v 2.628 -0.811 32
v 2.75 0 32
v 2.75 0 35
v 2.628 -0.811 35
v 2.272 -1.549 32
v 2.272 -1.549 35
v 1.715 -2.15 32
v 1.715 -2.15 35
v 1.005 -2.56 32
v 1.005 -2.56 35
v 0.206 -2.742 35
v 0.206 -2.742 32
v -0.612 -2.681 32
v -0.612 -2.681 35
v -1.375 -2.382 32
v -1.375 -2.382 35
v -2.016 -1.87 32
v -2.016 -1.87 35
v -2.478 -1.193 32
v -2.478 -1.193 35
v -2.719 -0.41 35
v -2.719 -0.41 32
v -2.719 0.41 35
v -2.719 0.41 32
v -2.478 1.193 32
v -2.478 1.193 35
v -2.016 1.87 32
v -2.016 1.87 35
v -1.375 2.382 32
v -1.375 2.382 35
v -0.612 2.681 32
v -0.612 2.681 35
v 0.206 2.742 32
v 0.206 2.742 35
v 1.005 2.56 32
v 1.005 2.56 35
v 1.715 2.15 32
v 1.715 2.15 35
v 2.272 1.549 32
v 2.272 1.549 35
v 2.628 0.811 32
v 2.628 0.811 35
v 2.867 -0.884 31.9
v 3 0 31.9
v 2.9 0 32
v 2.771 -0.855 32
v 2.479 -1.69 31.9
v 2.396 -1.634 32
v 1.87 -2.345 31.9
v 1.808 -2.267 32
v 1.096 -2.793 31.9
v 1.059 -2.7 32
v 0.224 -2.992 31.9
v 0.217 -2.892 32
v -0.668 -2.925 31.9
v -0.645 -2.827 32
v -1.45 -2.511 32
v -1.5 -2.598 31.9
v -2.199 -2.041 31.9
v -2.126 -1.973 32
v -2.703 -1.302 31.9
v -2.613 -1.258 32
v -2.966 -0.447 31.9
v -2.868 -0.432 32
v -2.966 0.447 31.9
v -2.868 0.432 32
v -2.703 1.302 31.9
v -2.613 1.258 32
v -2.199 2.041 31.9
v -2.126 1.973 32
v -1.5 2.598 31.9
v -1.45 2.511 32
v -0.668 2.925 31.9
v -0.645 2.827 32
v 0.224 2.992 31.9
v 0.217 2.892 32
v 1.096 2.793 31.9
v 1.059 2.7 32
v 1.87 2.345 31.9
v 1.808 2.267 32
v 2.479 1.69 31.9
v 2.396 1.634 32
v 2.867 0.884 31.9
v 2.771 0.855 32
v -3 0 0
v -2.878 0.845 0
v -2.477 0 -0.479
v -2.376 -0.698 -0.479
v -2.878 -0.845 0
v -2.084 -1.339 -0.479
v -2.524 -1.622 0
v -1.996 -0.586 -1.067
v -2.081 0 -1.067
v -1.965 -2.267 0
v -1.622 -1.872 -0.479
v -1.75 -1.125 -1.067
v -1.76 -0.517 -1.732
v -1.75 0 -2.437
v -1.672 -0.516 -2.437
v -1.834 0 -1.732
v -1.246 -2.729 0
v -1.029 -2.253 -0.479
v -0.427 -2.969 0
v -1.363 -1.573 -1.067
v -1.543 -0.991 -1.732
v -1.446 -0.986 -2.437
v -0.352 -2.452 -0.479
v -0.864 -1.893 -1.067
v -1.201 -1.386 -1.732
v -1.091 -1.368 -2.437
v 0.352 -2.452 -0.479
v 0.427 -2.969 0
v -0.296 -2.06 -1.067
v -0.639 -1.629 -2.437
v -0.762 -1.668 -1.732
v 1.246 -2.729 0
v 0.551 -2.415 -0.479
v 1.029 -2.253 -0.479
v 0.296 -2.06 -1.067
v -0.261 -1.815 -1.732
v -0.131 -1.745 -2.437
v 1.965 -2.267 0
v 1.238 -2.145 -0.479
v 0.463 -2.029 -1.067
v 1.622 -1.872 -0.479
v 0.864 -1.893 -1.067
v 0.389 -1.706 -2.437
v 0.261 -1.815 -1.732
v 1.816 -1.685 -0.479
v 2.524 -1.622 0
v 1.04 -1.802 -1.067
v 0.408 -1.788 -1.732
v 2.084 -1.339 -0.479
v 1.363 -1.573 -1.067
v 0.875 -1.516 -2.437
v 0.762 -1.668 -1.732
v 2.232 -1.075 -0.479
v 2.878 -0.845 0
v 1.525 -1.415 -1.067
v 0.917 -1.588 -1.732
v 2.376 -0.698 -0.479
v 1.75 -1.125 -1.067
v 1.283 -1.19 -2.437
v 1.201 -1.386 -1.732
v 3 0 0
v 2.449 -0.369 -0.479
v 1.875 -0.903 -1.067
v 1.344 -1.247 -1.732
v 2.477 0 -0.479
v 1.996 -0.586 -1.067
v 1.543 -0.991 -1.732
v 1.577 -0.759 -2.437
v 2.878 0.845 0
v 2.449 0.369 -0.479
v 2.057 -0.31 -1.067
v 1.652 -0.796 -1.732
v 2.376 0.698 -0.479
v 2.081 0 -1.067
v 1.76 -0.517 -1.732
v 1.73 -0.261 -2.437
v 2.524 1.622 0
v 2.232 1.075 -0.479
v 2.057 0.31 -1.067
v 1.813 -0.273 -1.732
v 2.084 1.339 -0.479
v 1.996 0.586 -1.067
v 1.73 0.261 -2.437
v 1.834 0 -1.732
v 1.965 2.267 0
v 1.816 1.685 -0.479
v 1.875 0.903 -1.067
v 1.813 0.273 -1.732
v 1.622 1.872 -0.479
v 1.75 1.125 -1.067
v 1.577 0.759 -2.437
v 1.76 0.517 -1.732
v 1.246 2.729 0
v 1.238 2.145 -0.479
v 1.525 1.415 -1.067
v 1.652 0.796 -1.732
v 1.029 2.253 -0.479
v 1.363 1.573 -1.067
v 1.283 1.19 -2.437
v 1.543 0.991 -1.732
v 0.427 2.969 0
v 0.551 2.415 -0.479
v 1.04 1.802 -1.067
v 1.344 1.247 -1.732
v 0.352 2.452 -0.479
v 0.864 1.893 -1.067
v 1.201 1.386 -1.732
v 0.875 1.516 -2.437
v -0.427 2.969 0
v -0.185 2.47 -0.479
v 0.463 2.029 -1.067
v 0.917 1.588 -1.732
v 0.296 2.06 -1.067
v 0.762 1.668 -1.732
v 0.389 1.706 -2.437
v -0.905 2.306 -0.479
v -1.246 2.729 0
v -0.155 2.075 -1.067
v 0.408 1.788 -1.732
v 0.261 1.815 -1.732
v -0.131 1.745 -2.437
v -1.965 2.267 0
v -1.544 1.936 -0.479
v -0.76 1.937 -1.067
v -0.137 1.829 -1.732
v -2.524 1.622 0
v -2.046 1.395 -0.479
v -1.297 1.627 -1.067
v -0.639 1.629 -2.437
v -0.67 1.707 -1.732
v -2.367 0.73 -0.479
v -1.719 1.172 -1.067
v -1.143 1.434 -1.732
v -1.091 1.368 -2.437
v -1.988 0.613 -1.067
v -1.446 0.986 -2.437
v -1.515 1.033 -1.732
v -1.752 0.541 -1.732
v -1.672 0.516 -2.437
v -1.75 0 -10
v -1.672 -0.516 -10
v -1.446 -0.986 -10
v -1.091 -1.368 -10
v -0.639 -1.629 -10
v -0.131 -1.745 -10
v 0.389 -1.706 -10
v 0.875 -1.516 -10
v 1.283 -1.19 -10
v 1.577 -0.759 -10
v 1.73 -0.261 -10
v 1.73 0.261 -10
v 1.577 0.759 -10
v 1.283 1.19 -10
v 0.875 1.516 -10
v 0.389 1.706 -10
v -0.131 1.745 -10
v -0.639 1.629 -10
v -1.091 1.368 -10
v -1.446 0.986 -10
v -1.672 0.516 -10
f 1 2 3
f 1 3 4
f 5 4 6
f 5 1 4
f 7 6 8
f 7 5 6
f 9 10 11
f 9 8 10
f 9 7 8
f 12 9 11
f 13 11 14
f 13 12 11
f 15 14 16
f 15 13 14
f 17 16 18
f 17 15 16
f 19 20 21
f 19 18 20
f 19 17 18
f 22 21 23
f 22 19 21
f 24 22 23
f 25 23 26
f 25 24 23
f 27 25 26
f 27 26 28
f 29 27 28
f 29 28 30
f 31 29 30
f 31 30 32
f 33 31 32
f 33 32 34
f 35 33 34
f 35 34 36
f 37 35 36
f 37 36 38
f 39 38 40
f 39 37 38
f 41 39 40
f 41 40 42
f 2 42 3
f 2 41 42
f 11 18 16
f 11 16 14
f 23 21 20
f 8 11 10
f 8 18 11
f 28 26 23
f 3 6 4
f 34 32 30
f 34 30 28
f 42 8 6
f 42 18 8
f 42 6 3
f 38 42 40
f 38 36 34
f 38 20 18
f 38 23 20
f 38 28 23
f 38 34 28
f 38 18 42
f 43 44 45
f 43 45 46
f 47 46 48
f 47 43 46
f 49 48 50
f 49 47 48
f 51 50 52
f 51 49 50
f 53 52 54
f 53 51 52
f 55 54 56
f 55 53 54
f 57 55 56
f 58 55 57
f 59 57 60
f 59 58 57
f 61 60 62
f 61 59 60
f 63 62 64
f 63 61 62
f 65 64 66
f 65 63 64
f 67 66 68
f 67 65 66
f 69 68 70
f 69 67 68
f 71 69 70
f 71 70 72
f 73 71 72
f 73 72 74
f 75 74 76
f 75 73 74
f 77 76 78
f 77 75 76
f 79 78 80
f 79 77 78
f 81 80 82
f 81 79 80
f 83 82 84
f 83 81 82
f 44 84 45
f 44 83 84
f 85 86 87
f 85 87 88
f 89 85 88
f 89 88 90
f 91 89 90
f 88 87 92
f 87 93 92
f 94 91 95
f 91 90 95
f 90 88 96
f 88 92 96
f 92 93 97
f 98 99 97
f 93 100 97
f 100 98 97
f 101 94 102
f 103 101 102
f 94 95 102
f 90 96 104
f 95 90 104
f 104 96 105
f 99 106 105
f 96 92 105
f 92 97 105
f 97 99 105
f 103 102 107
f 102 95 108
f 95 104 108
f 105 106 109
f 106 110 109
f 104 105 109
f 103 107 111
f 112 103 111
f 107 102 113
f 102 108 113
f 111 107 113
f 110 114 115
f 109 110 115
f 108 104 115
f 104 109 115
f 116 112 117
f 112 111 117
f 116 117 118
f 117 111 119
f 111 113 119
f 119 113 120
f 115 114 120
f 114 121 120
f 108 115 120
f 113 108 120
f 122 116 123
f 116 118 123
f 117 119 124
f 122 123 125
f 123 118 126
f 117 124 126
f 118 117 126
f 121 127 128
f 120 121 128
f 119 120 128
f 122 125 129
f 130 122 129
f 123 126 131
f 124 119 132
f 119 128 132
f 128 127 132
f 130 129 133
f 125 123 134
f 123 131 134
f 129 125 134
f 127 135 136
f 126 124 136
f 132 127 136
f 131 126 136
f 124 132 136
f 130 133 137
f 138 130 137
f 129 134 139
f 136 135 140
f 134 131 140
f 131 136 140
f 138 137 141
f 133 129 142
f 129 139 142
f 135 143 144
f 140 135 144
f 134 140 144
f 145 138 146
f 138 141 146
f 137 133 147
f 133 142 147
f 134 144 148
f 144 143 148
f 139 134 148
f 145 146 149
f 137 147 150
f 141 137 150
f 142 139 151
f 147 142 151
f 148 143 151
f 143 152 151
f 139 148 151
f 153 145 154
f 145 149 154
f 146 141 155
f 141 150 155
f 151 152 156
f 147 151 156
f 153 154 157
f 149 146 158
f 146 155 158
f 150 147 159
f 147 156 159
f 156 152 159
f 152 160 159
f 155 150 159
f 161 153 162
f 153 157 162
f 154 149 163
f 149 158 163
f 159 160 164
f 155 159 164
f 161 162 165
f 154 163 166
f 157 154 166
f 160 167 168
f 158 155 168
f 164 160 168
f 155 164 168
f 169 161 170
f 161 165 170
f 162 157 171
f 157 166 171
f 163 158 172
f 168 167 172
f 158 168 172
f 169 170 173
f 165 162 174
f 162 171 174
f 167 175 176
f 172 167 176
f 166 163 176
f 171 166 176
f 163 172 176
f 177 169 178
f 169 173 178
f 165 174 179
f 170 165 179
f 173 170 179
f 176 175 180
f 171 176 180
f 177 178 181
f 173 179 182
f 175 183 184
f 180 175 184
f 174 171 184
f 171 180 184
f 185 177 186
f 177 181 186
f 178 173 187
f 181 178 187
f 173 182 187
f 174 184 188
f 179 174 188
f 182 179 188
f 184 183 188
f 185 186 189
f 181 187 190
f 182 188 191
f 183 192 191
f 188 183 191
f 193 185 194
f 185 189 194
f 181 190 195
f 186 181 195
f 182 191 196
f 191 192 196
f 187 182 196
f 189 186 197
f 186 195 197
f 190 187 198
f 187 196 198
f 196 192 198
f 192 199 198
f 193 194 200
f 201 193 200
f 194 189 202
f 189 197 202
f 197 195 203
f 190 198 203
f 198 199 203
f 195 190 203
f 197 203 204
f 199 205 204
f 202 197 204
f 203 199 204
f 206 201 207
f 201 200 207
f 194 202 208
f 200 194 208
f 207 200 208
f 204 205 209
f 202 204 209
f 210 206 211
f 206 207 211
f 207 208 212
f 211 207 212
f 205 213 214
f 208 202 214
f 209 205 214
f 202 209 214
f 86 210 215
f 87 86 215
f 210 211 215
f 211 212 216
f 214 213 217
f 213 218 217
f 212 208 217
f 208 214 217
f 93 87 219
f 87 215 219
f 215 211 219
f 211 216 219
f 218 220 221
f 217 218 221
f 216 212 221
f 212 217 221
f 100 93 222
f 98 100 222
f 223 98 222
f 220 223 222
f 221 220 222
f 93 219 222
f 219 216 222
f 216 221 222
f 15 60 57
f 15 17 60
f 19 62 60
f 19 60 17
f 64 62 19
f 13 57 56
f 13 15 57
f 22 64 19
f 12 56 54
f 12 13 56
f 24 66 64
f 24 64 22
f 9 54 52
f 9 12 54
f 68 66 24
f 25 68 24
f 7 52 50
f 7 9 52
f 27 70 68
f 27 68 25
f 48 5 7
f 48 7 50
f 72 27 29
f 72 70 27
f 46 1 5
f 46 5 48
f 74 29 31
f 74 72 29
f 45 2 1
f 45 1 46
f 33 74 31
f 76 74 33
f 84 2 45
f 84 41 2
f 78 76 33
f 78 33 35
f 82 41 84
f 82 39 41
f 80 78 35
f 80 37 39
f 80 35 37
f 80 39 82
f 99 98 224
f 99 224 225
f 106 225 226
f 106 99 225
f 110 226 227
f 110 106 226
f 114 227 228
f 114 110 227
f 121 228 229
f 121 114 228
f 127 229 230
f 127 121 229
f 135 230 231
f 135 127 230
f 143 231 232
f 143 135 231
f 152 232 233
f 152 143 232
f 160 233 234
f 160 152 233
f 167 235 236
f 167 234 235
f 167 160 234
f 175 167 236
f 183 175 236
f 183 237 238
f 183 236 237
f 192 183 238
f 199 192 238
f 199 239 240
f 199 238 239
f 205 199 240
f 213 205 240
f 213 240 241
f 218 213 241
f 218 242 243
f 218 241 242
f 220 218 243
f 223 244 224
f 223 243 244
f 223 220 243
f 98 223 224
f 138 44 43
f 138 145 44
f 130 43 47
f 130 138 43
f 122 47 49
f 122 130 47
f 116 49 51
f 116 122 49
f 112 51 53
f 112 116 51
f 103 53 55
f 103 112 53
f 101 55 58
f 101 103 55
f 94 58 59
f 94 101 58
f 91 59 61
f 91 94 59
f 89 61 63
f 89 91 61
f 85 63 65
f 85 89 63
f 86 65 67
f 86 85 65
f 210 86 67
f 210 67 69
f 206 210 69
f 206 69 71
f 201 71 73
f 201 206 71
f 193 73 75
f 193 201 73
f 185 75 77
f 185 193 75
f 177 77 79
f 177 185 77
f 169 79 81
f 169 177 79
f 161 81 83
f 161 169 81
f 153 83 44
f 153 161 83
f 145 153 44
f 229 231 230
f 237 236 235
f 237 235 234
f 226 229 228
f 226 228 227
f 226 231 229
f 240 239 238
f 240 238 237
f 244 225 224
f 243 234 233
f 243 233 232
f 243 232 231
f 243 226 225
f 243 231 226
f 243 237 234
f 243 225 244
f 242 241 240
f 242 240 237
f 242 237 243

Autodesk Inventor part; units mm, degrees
ref_plane "YZ Plane" through (0, 0, 0) normal (1, 0, 0) x (0, 1, 0)
ref_plane "XZ Plane" through (0, 0, 0) normal (0, 1, 0) x (-1, 0, 0)
ref_plane "XY Plane" through (0, 0, 0) normal (0, 0, 1) x (1, 0, 0)
sketch "Sketch1" plane through (0, 0, 0) normal (0, 0, 1) x (1, 0, 0)
  circle A0 centre (0, 0) radius 3
  dimension "d0" = 6
extrude "Extrusion1" add sketch "Sketch1" along normal blind 32
sketch "Sketch2" plane through (0, 0, 32) normal (0, 0, 1) x (1, 0, 0)
  circle A0 centre (0, 0) radius 2.75
  dimension "d3" = 5.5
extrude "Extrusion2" add sketch "Sketch2" along normal blind 3
sketch "Sketch3" plane through (0, 0, 0) normal (0, 0, -1) x (-1, 0, 0)
  circle A0 centre (0, 0) radius 1.75
  dimension "d6" = 3.5
extrude "Extrusion3" add sketch "Sketch3" along normal blind 10
fillet "Fillet1" radius 3 1 edges at (1.75, 0, 0)
thread "Thread1" size "M6x0.7" class "6g" standard "ANSI Metric M Profile" full length
chamfer "Chamfer1" distance 0.1 angle 45 1 edges at (-3, 0, 32)
properties part number "6mm Inductive Probe" material "Stainless Steel"
